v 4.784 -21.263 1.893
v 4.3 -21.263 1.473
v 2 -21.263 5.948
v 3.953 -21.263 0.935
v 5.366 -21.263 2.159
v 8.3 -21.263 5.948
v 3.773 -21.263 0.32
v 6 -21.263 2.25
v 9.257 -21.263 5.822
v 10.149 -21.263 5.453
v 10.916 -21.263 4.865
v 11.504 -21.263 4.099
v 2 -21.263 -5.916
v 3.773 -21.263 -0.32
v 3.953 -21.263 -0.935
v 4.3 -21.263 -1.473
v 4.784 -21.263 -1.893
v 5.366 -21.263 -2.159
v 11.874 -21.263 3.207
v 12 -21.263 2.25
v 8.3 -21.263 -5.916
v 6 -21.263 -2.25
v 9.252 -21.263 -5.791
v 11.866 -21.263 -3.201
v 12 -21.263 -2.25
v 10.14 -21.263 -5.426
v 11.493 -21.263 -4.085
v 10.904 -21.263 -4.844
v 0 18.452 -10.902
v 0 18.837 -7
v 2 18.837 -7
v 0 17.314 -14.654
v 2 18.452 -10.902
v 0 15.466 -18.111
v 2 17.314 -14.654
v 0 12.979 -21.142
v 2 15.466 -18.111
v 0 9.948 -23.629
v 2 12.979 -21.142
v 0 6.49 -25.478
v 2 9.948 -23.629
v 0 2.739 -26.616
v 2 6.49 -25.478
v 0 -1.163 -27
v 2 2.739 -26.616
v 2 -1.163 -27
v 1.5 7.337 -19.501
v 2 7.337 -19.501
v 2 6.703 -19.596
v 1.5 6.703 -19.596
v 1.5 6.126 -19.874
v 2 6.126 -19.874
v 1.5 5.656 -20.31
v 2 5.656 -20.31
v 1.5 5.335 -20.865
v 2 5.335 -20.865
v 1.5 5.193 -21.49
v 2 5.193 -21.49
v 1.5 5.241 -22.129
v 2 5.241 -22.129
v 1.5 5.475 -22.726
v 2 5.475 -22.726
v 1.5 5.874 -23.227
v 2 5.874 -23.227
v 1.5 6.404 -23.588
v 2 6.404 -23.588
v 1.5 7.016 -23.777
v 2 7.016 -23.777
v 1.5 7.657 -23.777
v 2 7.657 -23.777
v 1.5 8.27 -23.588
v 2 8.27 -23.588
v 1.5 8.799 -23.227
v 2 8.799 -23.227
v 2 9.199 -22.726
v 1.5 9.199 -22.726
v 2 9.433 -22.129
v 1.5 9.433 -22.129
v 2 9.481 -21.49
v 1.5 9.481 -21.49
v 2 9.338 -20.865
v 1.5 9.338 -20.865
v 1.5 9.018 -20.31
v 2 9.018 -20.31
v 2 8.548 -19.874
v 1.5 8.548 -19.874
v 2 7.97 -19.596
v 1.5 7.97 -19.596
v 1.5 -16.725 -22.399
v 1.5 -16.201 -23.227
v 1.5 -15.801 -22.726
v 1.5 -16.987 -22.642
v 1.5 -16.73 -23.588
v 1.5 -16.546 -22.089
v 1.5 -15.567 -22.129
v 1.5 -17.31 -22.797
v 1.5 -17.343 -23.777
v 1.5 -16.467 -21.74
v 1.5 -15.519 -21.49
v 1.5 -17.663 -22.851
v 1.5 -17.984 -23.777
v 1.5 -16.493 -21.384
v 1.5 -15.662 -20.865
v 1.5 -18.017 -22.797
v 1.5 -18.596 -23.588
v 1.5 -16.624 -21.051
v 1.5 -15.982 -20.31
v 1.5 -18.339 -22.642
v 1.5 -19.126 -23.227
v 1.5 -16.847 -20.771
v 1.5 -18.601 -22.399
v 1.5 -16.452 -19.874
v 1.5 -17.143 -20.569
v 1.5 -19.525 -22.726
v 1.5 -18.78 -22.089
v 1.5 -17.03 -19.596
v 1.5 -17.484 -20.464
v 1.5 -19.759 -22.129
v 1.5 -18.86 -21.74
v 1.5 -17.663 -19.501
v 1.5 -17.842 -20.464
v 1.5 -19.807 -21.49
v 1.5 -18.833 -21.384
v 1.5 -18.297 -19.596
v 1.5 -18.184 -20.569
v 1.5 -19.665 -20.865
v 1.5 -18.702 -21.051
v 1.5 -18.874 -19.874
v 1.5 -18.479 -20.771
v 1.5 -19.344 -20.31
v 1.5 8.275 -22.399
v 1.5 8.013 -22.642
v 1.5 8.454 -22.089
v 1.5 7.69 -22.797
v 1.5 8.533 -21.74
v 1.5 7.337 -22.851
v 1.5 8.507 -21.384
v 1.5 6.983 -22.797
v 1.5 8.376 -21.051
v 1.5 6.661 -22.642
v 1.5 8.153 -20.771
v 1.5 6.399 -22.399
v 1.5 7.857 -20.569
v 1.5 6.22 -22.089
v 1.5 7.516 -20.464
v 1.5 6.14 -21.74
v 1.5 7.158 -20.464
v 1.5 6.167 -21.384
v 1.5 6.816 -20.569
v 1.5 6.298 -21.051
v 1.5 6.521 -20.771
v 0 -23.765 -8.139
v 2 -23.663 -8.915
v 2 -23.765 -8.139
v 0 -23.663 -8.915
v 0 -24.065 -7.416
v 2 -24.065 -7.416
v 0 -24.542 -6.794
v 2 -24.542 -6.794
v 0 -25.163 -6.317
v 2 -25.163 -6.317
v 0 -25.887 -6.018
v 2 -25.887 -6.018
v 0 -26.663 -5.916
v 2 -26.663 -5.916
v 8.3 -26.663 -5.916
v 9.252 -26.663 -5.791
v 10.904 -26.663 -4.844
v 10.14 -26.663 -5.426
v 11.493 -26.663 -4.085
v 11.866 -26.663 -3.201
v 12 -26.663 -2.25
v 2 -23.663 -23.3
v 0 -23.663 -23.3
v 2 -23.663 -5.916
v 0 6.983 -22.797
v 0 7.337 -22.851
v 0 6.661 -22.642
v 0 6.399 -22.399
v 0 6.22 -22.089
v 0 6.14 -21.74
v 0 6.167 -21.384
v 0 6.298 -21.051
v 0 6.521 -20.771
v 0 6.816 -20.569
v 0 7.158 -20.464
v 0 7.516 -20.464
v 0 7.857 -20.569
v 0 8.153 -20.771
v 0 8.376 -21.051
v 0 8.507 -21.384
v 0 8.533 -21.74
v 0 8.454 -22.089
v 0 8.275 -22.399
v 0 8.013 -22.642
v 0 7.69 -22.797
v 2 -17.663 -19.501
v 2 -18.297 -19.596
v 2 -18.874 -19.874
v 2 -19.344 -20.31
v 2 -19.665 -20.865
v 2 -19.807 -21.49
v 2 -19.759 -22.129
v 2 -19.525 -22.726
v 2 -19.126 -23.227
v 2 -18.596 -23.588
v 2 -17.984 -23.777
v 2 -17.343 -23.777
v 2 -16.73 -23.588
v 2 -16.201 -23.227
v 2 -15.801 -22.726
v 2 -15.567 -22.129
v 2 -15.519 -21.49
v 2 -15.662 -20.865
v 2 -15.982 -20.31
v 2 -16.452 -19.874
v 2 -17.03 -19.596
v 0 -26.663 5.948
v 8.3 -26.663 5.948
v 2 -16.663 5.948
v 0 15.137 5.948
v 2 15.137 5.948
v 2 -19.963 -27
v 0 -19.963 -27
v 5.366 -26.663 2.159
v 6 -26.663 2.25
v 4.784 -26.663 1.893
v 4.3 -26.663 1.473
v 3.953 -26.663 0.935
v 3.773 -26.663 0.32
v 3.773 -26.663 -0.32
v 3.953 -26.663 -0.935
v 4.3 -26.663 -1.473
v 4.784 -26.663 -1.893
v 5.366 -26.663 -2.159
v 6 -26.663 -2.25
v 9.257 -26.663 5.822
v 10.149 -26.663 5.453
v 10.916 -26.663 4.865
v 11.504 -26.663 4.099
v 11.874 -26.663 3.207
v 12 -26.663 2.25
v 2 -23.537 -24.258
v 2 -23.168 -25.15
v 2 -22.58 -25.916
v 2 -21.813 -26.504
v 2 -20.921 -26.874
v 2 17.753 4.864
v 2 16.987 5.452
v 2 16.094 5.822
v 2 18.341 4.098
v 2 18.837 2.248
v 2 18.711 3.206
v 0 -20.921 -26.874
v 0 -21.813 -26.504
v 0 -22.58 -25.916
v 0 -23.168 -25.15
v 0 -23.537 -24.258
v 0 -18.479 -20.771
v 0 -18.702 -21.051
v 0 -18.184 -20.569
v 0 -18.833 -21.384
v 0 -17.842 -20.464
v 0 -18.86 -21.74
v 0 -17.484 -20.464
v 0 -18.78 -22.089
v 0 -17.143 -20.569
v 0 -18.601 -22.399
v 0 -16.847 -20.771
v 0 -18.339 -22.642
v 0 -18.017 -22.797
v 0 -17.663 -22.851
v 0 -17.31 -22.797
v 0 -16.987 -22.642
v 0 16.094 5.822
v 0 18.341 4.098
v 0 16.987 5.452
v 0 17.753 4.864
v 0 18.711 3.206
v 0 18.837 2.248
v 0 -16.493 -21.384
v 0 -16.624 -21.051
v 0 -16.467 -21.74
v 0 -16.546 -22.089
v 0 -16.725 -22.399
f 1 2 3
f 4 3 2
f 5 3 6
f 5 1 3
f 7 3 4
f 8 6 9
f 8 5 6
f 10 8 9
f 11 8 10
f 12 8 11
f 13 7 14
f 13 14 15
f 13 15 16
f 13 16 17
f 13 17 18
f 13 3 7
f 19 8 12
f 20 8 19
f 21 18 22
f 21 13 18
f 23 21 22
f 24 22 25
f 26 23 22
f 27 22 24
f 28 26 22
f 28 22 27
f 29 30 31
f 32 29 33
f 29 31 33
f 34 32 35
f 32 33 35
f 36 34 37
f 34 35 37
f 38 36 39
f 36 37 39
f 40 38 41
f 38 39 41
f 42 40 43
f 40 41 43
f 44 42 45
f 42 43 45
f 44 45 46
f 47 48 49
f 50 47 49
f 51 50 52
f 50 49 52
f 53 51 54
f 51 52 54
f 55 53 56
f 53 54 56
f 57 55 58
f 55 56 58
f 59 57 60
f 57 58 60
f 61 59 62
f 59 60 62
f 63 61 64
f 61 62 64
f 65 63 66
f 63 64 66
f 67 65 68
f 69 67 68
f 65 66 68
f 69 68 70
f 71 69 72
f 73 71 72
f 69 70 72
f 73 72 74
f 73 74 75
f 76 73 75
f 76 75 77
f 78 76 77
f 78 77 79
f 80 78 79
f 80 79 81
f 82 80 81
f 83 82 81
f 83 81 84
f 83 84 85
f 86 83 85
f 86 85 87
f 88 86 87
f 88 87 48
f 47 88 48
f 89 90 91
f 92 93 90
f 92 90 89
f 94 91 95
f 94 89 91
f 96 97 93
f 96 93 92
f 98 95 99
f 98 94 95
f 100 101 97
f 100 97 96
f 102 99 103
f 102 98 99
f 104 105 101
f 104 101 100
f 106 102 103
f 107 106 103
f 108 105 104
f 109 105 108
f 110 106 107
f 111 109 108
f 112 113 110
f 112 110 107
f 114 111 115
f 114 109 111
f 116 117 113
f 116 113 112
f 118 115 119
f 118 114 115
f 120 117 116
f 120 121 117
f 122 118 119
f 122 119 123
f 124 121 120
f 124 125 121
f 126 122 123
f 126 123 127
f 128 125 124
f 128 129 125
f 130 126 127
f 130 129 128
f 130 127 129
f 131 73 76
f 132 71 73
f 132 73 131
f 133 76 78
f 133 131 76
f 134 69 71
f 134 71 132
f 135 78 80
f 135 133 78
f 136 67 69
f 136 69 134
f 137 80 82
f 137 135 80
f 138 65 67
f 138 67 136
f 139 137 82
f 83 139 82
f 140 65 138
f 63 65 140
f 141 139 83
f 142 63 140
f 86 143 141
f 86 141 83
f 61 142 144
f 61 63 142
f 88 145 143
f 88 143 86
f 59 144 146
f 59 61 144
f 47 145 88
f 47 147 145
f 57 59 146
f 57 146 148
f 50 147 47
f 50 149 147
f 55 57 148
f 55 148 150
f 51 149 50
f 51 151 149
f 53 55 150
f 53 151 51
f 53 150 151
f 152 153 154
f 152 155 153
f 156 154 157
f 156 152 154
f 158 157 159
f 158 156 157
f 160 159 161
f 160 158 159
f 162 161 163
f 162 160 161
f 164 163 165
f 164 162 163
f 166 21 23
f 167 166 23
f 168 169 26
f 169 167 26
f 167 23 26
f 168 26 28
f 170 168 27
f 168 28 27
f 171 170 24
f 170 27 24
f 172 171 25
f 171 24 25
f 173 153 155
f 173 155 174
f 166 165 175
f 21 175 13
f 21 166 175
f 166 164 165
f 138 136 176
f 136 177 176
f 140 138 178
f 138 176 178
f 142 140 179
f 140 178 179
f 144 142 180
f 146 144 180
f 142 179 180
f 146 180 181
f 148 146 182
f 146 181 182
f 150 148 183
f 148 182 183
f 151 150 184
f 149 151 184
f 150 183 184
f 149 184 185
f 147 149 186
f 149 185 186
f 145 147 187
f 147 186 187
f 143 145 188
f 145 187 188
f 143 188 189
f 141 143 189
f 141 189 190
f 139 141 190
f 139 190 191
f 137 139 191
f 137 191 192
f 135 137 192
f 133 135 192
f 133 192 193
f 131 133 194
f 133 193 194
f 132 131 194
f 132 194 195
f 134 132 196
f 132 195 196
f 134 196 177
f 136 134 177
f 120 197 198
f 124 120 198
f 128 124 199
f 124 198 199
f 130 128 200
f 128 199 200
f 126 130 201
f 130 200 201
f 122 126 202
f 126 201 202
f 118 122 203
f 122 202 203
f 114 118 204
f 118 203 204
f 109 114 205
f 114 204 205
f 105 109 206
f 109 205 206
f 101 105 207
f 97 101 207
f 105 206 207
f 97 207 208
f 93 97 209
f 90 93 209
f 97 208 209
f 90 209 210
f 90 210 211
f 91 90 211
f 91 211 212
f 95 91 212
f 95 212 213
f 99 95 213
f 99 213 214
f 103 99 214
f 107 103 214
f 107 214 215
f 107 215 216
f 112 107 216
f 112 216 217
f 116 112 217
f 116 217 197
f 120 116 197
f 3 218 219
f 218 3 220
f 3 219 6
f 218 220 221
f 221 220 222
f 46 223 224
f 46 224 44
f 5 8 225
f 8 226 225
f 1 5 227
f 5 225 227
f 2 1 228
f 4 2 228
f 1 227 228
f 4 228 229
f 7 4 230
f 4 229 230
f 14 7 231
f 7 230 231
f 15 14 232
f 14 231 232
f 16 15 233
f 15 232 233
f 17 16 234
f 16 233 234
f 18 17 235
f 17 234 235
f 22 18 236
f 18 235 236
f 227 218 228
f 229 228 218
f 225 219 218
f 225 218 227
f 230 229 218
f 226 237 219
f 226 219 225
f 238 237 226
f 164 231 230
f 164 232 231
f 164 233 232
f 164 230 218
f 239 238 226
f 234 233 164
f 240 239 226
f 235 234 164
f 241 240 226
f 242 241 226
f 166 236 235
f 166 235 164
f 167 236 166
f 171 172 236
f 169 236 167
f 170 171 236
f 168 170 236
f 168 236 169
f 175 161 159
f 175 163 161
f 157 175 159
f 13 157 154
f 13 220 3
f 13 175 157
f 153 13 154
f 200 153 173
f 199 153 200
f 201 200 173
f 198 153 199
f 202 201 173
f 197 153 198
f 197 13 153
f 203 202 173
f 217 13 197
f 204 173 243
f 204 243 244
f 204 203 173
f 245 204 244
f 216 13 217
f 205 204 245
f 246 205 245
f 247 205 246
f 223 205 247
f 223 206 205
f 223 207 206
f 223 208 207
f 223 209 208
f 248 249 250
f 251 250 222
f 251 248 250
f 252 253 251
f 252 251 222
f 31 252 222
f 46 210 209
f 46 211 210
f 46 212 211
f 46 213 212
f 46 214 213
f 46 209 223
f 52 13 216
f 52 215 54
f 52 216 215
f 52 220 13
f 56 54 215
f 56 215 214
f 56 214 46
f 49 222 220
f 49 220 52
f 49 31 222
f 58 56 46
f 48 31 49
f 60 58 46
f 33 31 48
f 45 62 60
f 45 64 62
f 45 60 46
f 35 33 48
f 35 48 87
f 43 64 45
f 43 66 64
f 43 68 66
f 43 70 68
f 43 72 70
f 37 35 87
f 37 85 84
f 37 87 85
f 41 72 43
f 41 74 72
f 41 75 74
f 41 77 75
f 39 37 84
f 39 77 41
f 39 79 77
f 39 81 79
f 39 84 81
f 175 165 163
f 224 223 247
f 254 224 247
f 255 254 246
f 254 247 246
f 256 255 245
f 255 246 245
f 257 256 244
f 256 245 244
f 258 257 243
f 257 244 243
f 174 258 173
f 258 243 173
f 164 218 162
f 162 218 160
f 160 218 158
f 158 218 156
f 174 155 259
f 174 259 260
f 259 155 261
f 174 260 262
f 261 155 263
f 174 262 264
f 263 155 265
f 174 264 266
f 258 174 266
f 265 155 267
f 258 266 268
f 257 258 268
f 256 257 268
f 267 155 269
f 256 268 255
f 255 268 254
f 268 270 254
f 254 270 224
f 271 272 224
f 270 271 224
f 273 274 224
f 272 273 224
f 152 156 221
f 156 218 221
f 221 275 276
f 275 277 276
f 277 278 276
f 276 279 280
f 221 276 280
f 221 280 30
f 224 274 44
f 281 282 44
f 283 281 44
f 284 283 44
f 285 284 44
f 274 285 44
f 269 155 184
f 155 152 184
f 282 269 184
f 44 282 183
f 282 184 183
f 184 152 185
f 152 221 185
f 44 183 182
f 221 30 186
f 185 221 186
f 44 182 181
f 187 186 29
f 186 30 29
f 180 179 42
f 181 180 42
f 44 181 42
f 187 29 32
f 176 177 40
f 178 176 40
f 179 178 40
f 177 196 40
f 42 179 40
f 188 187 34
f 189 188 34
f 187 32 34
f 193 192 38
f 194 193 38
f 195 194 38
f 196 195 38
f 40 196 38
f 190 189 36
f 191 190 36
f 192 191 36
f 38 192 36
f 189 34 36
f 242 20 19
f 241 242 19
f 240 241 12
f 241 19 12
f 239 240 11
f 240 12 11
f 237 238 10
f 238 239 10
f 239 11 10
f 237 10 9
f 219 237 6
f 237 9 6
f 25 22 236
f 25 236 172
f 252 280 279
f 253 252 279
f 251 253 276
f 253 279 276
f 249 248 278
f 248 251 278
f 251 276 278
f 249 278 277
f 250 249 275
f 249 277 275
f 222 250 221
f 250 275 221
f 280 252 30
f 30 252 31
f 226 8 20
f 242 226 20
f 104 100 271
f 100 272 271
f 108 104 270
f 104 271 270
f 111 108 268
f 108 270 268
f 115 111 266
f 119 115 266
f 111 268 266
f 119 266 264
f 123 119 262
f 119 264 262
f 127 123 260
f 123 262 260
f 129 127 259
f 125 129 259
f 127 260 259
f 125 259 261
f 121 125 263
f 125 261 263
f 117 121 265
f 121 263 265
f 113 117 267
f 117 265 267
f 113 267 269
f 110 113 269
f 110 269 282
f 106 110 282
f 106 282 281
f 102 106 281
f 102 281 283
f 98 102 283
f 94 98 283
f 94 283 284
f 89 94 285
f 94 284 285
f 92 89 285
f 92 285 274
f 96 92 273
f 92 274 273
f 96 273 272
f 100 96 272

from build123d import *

# Parameters (mm, degrees)
SKETCH_1_W                = 39.896146096
SKETCH_1_H                = 53.32653191
EXTRUDE_1_DEPTH           = 2
SKETCH_2_W                = 12
SKETCH_2_H                = 39.863647893
EXTRUDE_2_DEPTH           = 10
HOLE_WIZARD_1_D           = 4.5
HOLE_WIZARD_1_CBORE_D     = 8
HOLE_WIZARD_1_CBORE_DEPTH = 4.6
SKETCH_6_W                = 10
SKETCH_6_H                = 14
CUT_EXTRUDE_1_DEPTH       = 50.184489279
SKETCH_8_W                = 7.051926952
SKETCH_8_H                = 53.179699591
EXTRUDE_3_DEPTH           = 2
CUT_EXTRUDE_2_DEPTH       = 40.24193868
HOLE_WIZARD_2_D           = 2.4
HOLE_WIZARD_2_CBORE_D     = 4.3
HOLE_WIZARD_2_CBORE_DEPTH = 0.5
SKETCH_12_W               = 21.084425155
SKETCH_12_H               = 3
CUT_EXTRUDE_3_DEPTH       = 40.24193868
FILLET_1_R                = 3
SKETCH_13_W               = 15.522379956
SKETCH_13_H               = 43.706267889
CUT_EXTRUDE_4_DEPTH       = 40.24193868
SKETCH_14_W               = 6
SKETCH_14_H               = 11.863647893
CUT_EXTRUDE_5_DEPTH       = 4.6
SKETCH_15_W               = 6
SKETCH_15_H               = 4.5
CUT_EXTRUDE_6_DEPTH       = 50.809738004
FILLET_2_R                = 3.7
FILLET_3_R                = 3.7
SKETCH_17_W               = 11.863647893
SKETCH_17_H               = 4.6
CUT_EXTRUDE_7_DEPTH       = 4


# Some blends are built 0.0001 mm under size
with BuildPart() as part:
    # 草图1 → 凸台-拉伸1 (new body)
    with BuildSketch(Plane(origin=(0, 0, 0), x_dir=(0, 0, -1), z_dir=(1, 0, 0))):
        Rectangle(SKETCH_1_W, SKETCH_1_H)
    extrude(amount=EXTRUDE_1_DEPTH)

    # 草图2 → 凸台-拉伸2 (add)
    with BuildSketch(Plane.XZ.offset(26.663265955)):
        with Locations((6, 0.016249101)):
            Rectangle(SKETCH_2_W, SKETCH_2_H)
    extrude(amount=-EXTRUDE_2_DEPTH)

    # 打孔尺寸(%根据)内六角圆柱头螺钉的类型1 (through all)
    with Locations(Plane(origin=(6, -16.663265955, 0), x_dir=(0, 0, 1), z_dir=(0, 1, 0))):
        with Locations((0, 0)):
            CounterBoreHole(HOLE_WIZARD_1_D / 2, HOLE_WIZARD_1_CBORE_D / 2, HOLE_WIZARD_1_CBORE_DEPTH)

    # 草图6 → 切除-拉伸1 (cut, through all)
    with BuildSketch(Plane(origin=(0, -16.663265955, 0), x_dir=(1, 0, 0), z_dir=(0, 1, 0))):
        with Locations((7, 12.915574845)):
            Rectangle(SKETCH_6_W, SKETCH_6_H)
        with Locations((7, -12.948073048)):
            Rectangle(SKETCH_6_W, SKETCH_6_H)
    extrude(amount=-CUT_EXTRUDE_1_DEPTH, mode=Mode.SUBTRACT)

    # 草图8 → 凸台-拉伸3 (add)
    with BuildSketch(Plane(origin=(2, 0, 0), x_dir=(0, 0, -1), z_dir=(1, 0, 0))):
        with Locations((23.474036524, -0.073416159)):
            Rectangle(SKETCH_8_W, SKETCH_8_H)
    extrude(amount=-EXTRUDE_3_DEPTH)

    # 草图9 → 切除-拉伸2 (cut, through all)
    with BuildSketch(Plane(origin=(2, 0, 0), x_dir=(0, 0, -1), z_dir=(1, 0, 0))):
        with BuildLine():
            ThreePointArc((-10.54, 13.836734045), (-9.075533906, 17.372267951), (-5.54, 18.836734045))
            Line((-5.54, 18.836734045), (7, 18.836734045))
            ThreePointArc((7, 18.836734045), (21.142135624, 12.978869669), (27, -1.163265955))
            Line((27, -1.163265955), (27, 26.516433636))
            Line((27, 26.516433636), (19.948073048, 26.516433636))
            Line((19.948073048, 26.516433636), (19.948073048, 26.663265955))
            Line((19.948073048, 26.663265955), (-19.948073048, 26.663265955))
            Line((-19.948073048, 26.663265955), (-19.948073048, -3.722994561))
            ThreePointArc((-19.948073048, -3.722994561), (-17.113911838, 5.186324453), (-10.54, 11.834039714))
            Line((-10.54, 11.834039714), (-10.54, 13.836734045))
        make_face()
        with BuildLine():
            ThreePointArc((-5.948073048, -24.258302666), (-15.670841721, -17.590040264), (-19.948073048, -6.603537348))
            Line((-19.948073048, -6.603537348), (-19.948073048, -26.663265955))
            Line((-19.948073048, -26.663265955), (-5.948073048, -26.663265955))
            Line((-5.948073048, -26.663265955), (-5.948073048, -24.258302666))
        make_face()
    extrude(amount=-CUT_EXTRUDE_2_DEPTH, mode=Mode.SUBTRACT)

    # 打孔尺寸(%根据)内六角圆柱头螺钉的类型2 (through all)
    with Locations(Plane(origin=(2, 7.336734045, -21.650635095), x_dir=(0, 0, 1), z_dir=(1, 0, 0))):
        with Locations((0, 0), (0, 25)):
            CounterBoreHole(HOLE_WIZARD_2_D / 2, HOLE_WIZARD_2_CBORE_D / 2, HOLE_WIZARD_2_CBORE_DEPTH)

    # 草图12 → 切除-拉伸3 (cut, through all)
    with BuildSketch(Plane(origin=(2, 0, 0), x_dir=(0, 0, -1), z_dir=(1, 0, 0))):
        with Locations((16.457787423, -25.163265955)):
            Rectangle(SKETCH_12_W, SKETCH_12_H)
    extrude(amount=-CUT_EXTRUDE_3_DEPTH, mode=Mode.SUBTRACT)

    # 圆角1
    fillet_1_edges = [part.edges().sort_by_distance(p)[0] for p in [
        (1, -23.663265955, -5.915574845),
    ]]
    fillet(fillet_1_edges, radius=FILLET_1_R - 0.0001)  # a hair under: the kernel refuses the full size

    # 草图13 → 切除-拉伸4 (cut, through all)
    with BuildSketch(Plane(origin=(2, 0, 0), x_dir=(0, 0, -1), z_dir=(1, 0, 0))):
        with Locations((-13.709263026, -2.405168722)):
            Rectangle(SKETCH_13_W, SKETCH_13_H)
    extrude(amount=-CUT_EXTRUDE_4_DEPTH, mode=Mode.SUBTRACT)

    # 草图14 → 切除-拉伸5 (cut)
    with BuildSketch(Plane(origin=(0, -16.663265955, 0), x_dir=(1, 0, 0), z_dir=(0, 1, 0))):
        with Locations((9, -0.016249102)):
            Rectangle(SKETCH_14_W, SKETCH_14_H)
    extrude(amount=-CUT_EXTRUDE_5_DEPTH, mode=Mode.SUBTRACT)

    # 草图15 → 切除-拉伸6 (cut, through all)
    with BuildSketch(Plane(origin=(0, -21.263265955, 0), x_dir=(1, 0, 0), z_dir=(0, 1, 0))):
        with Locations((9, 0)):
            Rectangle(SKETCH_15_W, SKETCH_15_H)
    extrude(amount=-CUT_EXTRUDE_6_DEPTH, mode=Mode.SUBTRACT)

    # 圆角2
    # the kernel refuses this fillet: 3.7 mm, written as the material it takes off along each edge
    with BuildSketch(Plane(origin=(12, -12.013265955, -5.915574845), x_dir=(-1, 0, 0), z_dir=(0, -1, 0))) as fillet_2_piece_1:
        with BuildLine():
            CenterArc((FILLET_2_R, -FILLET_2_R), FILLET_2_R, 90, 90)
            Line((0, -FILLET_2_R), (0, 0))
            Line((0, 0), (FILLET_2_R, 0))
        make_face()
    extrude(amount=23.9, mode=Mode.SUBTRACT)
    with BuildSketch(Plane(origin=(12, -12.013265955, 5.948073048), x_dir=(-1, 0, 0), z_dir=(0, -1, 0))) as fillet_2_piece_2:
        with BuildLine():
            CenterArc((FILLET_2_R, FILLET_2_R), FILLET_2_R, 180, 90)
            Line((0, FILLET_2_R), (0, 0))
            Line((0, 0), (FILLET_2_R, 0))
        make_face()
    extrude(amount=23.9, mode=Mode.SUBTRACT)

    # 圆角3
    # the kernel refuses this fillet: 3.7 mm, written as the material it takes off along each edge
    with BuildSketch(Plane(origin=(11.25, -23.663265955, -27), x_dir=(0, 1, 0), z_dir=(-1, 0, 0))) as fillet_3_piece_1:
        with BuildLine():
            CenterArc((FILLET_3_R, -FILLET_3_R), FILLET_3_R, 90, 90)
            Line((0, -FILLET_3_R), (0, 0))
            Line((0, 0), (FILLET_3_R, 0))
        make_face()
    extrude(amount=20.5, mode=Mode.SUBTRACT)
    with BuildSketch(Plane(origin=(-9.250093996, 18.820053861, 5.948073048), x_dir=(0, -1, 0), z_dir=(1, 0, 0))) as fillet_3_piece_2:
        with BuildLine():
            CenterArc((3.683319816, 3.7), FILLET_3_R, 180, 90)
            Line((-0.016680184, 3.7), (-0.386680184, 3.7))
            ThreePointArc((-0.386680184, 3.7), (-0.386680184, 0.408073048), (-0.368765666, -0.030197406))
            Line((-0.368765666, -0.030197406), (0, -0.37))
            Line((0, -0.37), (3.683319816, -0.37))
            Line((3.683319816, -0.37), (3.683319816, 0))
        make_face()
    extrude(amount=20.500187991, mode=Mode.SUBTRACT)

    # 草图17 → 切除-拉伸7 (cut)
    with BuildSketch(Plane(origin=(6, 0, 0), x_dir=(0, 0, -1), z_dir=(1, 0, 0))):
        with Locations((-0.016249102, -18.963265955)):
            Rectangle(SKETCH_17_W, SKETCH_17_H)
    extrude(amount=-CUT_EXTRUDE_7_DEPTH, mode=Mode.SUBTRACT)


solid = part.part
